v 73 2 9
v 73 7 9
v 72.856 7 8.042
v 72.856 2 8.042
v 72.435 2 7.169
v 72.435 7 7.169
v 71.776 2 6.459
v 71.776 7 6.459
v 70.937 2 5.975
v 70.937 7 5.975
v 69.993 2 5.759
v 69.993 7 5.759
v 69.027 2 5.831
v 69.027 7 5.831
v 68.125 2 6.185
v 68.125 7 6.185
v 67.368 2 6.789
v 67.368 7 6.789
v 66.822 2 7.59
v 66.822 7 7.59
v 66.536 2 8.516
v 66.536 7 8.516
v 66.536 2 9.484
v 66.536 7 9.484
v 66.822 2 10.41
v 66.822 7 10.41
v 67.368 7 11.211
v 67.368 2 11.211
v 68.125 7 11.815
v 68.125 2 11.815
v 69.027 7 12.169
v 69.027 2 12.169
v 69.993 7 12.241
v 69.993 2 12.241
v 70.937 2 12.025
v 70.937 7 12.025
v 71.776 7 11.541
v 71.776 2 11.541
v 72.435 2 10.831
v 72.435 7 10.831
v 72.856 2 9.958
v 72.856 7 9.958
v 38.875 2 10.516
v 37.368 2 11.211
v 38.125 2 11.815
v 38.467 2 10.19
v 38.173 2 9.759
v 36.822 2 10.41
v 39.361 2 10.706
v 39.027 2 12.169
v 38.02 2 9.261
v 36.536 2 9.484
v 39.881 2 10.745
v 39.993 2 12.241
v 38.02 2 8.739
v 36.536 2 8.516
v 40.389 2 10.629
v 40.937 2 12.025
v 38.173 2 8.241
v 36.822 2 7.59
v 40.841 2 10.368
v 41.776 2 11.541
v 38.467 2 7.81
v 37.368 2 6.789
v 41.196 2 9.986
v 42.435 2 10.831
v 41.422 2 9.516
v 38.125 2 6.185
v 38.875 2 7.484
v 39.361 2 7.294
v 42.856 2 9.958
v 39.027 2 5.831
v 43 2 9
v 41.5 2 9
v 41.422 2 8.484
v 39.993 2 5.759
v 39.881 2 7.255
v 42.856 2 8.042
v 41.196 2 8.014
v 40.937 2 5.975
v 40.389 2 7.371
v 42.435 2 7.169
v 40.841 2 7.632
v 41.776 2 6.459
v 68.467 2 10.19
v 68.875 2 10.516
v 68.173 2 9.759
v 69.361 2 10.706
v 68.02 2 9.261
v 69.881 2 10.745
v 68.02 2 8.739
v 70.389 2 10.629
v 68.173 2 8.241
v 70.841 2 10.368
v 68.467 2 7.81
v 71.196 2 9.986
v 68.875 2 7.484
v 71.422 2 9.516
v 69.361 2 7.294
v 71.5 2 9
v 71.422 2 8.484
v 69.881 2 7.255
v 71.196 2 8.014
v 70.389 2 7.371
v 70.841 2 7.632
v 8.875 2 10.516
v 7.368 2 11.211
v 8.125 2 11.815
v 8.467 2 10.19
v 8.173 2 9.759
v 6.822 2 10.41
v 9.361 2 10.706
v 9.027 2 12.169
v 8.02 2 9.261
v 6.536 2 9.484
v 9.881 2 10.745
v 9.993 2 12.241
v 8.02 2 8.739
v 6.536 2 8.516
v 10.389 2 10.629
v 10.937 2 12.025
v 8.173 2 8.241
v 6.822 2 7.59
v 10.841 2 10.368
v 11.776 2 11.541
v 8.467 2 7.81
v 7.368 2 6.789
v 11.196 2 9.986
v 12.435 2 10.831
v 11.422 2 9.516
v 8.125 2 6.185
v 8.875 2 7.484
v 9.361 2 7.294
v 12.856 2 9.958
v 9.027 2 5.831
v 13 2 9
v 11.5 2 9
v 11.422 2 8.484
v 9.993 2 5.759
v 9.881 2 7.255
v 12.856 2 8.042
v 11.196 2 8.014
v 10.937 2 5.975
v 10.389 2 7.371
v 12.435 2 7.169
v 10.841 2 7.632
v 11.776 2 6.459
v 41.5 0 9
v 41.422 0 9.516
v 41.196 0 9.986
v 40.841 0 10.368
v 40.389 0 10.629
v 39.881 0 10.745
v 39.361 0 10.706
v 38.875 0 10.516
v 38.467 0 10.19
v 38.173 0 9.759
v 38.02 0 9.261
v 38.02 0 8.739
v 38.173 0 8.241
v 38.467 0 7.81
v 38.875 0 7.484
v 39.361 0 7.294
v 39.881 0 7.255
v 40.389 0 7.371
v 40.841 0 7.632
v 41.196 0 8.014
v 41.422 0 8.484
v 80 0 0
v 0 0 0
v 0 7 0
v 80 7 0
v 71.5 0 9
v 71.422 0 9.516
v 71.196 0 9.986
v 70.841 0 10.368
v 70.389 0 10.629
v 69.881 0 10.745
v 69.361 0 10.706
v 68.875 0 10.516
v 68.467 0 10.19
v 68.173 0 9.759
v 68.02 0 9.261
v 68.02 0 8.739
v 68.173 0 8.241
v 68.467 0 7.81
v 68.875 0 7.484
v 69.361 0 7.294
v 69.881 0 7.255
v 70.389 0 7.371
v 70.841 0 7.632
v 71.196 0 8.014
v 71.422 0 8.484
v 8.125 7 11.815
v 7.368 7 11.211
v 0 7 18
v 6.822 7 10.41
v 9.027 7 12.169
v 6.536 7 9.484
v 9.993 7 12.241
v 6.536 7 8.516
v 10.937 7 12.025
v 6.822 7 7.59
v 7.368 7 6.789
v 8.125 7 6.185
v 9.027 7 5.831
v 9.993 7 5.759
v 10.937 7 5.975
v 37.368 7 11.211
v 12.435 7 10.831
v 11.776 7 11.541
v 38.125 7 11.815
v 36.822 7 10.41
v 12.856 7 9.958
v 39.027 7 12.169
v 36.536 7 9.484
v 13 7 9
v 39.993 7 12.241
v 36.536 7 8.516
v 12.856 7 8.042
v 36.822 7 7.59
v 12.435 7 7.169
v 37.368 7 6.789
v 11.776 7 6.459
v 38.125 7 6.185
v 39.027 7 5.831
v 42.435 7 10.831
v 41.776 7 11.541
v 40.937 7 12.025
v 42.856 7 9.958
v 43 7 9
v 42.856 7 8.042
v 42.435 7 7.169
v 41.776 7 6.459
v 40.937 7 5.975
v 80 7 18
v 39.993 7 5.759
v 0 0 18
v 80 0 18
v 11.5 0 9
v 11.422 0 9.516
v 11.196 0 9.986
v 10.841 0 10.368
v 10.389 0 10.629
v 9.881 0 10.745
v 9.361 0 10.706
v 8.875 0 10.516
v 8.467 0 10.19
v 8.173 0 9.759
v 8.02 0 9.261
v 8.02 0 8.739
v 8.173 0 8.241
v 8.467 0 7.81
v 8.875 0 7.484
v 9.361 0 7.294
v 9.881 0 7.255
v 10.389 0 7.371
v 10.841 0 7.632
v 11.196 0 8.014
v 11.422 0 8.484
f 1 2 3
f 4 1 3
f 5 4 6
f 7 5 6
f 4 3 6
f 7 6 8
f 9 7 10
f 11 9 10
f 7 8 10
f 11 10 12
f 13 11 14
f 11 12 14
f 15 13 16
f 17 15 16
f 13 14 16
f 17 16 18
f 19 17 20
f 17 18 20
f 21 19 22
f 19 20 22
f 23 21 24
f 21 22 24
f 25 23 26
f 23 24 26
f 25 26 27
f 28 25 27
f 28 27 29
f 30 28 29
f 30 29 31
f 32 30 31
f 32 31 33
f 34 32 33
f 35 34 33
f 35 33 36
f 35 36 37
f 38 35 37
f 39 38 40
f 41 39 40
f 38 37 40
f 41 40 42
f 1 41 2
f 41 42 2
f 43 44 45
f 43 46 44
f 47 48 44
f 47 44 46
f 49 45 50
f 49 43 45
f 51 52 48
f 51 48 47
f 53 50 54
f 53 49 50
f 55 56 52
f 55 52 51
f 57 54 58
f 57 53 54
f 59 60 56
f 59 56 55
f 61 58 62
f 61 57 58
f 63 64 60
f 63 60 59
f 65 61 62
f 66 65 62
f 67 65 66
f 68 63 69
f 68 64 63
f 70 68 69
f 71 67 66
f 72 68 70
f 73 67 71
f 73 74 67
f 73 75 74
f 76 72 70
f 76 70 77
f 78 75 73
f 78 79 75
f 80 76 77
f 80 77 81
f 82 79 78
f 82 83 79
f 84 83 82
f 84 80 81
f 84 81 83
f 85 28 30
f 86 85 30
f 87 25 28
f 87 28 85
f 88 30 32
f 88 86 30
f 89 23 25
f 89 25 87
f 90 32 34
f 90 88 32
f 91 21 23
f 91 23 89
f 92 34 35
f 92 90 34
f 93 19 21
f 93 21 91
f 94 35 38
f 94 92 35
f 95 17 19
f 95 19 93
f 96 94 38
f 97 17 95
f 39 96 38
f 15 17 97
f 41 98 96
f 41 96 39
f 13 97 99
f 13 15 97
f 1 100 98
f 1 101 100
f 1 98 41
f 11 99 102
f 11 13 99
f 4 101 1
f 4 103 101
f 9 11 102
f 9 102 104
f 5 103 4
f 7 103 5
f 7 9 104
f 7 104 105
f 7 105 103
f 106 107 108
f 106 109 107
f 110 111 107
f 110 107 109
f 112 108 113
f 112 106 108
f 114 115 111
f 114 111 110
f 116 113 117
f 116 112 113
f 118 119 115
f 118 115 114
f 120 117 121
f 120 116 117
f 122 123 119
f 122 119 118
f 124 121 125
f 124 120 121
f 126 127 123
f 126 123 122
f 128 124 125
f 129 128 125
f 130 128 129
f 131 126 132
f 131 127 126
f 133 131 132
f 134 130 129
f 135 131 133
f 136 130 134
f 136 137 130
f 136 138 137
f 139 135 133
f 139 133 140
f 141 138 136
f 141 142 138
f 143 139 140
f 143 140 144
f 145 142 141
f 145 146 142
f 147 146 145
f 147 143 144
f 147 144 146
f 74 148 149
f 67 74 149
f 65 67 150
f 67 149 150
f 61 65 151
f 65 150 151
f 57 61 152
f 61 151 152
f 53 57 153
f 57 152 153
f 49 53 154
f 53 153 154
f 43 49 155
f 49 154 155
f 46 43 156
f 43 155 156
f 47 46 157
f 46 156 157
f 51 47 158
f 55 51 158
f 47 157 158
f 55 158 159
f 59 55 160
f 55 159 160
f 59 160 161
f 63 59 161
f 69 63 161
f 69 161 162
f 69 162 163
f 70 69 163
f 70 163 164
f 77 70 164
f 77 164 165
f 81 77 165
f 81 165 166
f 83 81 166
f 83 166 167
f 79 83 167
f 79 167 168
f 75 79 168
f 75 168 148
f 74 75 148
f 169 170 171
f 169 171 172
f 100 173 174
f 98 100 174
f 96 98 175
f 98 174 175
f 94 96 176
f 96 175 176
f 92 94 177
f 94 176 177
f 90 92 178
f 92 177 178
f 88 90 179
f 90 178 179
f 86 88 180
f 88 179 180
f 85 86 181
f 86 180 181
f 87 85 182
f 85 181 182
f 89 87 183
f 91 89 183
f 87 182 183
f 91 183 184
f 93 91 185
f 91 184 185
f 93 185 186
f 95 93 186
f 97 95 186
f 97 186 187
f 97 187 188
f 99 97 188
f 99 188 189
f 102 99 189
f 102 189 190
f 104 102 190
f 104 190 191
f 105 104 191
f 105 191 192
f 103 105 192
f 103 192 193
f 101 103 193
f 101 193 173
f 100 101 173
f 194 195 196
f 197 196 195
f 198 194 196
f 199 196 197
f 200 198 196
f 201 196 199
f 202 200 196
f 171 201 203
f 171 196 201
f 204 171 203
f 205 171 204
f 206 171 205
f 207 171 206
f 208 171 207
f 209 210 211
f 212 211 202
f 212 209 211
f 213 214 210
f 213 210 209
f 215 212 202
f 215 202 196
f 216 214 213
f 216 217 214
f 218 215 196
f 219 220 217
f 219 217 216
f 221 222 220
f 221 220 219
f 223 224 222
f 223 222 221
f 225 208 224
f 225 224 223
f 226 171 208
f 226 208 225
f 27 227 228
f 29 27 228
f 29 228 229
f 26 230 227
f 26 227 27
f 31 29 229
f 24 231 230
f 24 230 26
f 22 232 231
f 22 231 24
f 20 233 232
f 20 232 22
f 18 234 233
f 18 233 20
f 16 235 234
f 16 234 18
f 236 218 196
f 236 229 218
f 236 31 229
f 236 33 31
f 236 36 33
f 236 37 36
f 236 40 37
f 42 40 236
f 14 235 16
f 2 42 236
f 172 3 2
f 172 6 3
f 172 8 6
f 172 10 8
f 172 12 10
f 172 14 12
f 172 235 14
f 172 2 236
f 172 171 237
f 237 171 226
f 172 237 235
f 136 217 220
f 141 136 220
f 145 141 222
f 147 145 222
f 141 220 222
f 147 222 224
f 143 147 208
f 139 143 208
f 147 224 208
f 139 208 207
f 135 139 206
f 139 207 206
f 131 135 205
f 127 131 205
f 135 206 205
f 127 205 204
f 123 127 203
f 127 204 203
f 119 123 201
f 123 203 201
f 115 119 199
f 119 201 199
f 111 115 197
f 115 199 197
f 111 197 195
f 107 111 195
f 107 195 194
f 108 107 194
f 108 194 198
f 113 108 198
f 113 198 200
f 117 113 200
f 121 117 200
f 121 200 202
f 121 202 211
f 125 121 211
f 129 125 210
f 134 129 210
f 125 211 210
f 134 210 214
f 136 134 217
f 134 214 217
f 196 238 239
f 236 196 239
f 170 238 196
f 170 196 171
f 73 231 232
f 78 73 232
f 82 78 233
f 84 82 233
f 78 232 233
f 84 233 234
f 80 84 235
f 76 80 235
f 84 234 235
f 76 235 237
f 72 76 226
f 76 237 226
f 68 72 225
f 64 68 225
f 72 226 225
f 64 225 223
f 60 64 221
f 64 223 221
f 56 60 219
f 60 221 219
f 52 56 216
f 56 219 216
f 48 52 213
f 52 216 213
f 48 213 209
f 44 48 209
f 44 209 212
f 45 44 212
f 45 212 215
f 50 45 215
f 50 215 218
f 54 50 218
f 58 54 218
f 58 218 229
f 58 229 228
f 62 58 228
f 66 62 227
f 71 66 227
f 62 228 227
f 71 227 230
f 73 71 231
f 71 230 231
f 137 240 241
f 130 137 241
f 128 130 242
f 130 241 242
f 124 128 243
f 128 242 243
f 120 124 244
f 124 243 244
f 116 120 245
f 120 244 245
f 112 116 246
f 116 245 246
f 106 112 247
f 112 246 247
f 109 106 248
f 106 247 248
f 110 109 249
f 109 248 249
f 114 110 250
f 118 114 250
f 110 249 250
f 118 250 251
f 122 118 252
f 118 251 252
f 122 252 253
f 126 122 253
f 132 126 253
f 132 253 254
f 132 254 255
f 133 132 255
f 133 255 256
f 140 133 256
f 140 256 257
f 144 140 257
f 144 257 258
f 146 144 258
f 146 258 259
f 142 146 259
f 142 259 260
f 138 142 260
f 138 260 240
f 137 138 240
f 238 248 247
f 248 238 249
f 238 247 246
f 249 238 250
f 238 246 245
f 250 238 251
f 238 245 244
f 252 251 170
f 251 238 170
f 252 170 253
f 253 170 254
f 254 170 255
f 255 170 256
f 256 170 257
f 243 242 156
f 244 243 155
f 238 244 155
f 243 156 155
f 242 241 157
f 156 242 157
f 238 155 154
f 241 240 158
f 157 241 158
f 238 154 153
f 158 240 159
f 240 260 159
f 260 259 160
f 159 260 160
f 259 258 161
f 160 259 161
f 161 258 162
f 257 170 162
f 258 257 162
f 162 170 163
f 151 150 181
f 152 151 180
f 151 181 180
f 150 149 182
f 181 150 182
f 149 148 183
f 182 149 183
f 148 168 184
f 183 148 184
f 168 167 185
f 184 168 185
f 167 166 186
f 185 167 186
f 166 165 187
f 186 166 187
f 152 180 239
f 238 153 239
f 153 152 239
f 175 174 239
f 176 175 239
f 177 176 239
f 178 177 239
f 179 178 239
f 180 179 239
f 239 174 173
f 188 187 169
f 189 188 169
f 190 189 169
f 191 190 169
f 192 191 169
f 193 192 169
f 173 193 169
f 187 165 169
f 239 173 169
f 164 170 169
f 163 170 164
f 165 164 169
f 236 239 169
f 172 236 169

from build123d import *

# Parameters (mm, degrees)
SKETCH_1_W          = 80
SKETCH_1_H          = 18
EXTRUDE_1_DEPTH     = 7
SKETCH_2_R          = 3.25
CUT_EXTRUDE_1_DEPTH = 5
SKETCH_3_R          = 1.75
CUT_EXTRUDE_3_DEPTH = 8


with BuildPart() as part:
    # 草图1 → 凸台-拉伸1 (new body)
    with BuildSketch(Plane(origin=(0, 0, 0), x_dir=(1, 0, 0), z_dir=(0, 1, 0))):
        with Locations((40, -9)):
            Rectangle(SKETCH_1_W, SKETCH_1_H)
    extrude(amount=EXTRUDE_1_DEPTH)

    # 草图2 → 切除-拉伸1 (cut)
    with BuildSketch(Plane(origin=(0, 7, 0), x_dir=(1, 0, 0), z_dir=(0, 1, 0))):
        with Locations((9.75, -9)):
            Circle(SKETCH_2_R)
        with Locations((39.75, -9)):
            Circle(SKETCH_2_R)
        with Locations((69.75, -9)):
            Circle(SKETCH_2_R)
    extrude(amount=-CUT_EXTRUDE_1_DEPTH, mode=Mode.SUBTRACT)

    # 草图3 → 切除-拉伸3 (cut, through all)
    with BuildSketch(Plane.XZ):
        with Locations((9.75, 9)):
            Circle(SKETCH_3_R)
        with Locations((39.75, 9)):
            Circle(SKETCH_3_R)
        with Locations((69.75, 9)):
            Circle(SKETCH_3_R)
    extrude(amount=-CUT_EXTRUDE_3_DEPTH, mode=Mode.SUBTRACT)


solid = part.part
